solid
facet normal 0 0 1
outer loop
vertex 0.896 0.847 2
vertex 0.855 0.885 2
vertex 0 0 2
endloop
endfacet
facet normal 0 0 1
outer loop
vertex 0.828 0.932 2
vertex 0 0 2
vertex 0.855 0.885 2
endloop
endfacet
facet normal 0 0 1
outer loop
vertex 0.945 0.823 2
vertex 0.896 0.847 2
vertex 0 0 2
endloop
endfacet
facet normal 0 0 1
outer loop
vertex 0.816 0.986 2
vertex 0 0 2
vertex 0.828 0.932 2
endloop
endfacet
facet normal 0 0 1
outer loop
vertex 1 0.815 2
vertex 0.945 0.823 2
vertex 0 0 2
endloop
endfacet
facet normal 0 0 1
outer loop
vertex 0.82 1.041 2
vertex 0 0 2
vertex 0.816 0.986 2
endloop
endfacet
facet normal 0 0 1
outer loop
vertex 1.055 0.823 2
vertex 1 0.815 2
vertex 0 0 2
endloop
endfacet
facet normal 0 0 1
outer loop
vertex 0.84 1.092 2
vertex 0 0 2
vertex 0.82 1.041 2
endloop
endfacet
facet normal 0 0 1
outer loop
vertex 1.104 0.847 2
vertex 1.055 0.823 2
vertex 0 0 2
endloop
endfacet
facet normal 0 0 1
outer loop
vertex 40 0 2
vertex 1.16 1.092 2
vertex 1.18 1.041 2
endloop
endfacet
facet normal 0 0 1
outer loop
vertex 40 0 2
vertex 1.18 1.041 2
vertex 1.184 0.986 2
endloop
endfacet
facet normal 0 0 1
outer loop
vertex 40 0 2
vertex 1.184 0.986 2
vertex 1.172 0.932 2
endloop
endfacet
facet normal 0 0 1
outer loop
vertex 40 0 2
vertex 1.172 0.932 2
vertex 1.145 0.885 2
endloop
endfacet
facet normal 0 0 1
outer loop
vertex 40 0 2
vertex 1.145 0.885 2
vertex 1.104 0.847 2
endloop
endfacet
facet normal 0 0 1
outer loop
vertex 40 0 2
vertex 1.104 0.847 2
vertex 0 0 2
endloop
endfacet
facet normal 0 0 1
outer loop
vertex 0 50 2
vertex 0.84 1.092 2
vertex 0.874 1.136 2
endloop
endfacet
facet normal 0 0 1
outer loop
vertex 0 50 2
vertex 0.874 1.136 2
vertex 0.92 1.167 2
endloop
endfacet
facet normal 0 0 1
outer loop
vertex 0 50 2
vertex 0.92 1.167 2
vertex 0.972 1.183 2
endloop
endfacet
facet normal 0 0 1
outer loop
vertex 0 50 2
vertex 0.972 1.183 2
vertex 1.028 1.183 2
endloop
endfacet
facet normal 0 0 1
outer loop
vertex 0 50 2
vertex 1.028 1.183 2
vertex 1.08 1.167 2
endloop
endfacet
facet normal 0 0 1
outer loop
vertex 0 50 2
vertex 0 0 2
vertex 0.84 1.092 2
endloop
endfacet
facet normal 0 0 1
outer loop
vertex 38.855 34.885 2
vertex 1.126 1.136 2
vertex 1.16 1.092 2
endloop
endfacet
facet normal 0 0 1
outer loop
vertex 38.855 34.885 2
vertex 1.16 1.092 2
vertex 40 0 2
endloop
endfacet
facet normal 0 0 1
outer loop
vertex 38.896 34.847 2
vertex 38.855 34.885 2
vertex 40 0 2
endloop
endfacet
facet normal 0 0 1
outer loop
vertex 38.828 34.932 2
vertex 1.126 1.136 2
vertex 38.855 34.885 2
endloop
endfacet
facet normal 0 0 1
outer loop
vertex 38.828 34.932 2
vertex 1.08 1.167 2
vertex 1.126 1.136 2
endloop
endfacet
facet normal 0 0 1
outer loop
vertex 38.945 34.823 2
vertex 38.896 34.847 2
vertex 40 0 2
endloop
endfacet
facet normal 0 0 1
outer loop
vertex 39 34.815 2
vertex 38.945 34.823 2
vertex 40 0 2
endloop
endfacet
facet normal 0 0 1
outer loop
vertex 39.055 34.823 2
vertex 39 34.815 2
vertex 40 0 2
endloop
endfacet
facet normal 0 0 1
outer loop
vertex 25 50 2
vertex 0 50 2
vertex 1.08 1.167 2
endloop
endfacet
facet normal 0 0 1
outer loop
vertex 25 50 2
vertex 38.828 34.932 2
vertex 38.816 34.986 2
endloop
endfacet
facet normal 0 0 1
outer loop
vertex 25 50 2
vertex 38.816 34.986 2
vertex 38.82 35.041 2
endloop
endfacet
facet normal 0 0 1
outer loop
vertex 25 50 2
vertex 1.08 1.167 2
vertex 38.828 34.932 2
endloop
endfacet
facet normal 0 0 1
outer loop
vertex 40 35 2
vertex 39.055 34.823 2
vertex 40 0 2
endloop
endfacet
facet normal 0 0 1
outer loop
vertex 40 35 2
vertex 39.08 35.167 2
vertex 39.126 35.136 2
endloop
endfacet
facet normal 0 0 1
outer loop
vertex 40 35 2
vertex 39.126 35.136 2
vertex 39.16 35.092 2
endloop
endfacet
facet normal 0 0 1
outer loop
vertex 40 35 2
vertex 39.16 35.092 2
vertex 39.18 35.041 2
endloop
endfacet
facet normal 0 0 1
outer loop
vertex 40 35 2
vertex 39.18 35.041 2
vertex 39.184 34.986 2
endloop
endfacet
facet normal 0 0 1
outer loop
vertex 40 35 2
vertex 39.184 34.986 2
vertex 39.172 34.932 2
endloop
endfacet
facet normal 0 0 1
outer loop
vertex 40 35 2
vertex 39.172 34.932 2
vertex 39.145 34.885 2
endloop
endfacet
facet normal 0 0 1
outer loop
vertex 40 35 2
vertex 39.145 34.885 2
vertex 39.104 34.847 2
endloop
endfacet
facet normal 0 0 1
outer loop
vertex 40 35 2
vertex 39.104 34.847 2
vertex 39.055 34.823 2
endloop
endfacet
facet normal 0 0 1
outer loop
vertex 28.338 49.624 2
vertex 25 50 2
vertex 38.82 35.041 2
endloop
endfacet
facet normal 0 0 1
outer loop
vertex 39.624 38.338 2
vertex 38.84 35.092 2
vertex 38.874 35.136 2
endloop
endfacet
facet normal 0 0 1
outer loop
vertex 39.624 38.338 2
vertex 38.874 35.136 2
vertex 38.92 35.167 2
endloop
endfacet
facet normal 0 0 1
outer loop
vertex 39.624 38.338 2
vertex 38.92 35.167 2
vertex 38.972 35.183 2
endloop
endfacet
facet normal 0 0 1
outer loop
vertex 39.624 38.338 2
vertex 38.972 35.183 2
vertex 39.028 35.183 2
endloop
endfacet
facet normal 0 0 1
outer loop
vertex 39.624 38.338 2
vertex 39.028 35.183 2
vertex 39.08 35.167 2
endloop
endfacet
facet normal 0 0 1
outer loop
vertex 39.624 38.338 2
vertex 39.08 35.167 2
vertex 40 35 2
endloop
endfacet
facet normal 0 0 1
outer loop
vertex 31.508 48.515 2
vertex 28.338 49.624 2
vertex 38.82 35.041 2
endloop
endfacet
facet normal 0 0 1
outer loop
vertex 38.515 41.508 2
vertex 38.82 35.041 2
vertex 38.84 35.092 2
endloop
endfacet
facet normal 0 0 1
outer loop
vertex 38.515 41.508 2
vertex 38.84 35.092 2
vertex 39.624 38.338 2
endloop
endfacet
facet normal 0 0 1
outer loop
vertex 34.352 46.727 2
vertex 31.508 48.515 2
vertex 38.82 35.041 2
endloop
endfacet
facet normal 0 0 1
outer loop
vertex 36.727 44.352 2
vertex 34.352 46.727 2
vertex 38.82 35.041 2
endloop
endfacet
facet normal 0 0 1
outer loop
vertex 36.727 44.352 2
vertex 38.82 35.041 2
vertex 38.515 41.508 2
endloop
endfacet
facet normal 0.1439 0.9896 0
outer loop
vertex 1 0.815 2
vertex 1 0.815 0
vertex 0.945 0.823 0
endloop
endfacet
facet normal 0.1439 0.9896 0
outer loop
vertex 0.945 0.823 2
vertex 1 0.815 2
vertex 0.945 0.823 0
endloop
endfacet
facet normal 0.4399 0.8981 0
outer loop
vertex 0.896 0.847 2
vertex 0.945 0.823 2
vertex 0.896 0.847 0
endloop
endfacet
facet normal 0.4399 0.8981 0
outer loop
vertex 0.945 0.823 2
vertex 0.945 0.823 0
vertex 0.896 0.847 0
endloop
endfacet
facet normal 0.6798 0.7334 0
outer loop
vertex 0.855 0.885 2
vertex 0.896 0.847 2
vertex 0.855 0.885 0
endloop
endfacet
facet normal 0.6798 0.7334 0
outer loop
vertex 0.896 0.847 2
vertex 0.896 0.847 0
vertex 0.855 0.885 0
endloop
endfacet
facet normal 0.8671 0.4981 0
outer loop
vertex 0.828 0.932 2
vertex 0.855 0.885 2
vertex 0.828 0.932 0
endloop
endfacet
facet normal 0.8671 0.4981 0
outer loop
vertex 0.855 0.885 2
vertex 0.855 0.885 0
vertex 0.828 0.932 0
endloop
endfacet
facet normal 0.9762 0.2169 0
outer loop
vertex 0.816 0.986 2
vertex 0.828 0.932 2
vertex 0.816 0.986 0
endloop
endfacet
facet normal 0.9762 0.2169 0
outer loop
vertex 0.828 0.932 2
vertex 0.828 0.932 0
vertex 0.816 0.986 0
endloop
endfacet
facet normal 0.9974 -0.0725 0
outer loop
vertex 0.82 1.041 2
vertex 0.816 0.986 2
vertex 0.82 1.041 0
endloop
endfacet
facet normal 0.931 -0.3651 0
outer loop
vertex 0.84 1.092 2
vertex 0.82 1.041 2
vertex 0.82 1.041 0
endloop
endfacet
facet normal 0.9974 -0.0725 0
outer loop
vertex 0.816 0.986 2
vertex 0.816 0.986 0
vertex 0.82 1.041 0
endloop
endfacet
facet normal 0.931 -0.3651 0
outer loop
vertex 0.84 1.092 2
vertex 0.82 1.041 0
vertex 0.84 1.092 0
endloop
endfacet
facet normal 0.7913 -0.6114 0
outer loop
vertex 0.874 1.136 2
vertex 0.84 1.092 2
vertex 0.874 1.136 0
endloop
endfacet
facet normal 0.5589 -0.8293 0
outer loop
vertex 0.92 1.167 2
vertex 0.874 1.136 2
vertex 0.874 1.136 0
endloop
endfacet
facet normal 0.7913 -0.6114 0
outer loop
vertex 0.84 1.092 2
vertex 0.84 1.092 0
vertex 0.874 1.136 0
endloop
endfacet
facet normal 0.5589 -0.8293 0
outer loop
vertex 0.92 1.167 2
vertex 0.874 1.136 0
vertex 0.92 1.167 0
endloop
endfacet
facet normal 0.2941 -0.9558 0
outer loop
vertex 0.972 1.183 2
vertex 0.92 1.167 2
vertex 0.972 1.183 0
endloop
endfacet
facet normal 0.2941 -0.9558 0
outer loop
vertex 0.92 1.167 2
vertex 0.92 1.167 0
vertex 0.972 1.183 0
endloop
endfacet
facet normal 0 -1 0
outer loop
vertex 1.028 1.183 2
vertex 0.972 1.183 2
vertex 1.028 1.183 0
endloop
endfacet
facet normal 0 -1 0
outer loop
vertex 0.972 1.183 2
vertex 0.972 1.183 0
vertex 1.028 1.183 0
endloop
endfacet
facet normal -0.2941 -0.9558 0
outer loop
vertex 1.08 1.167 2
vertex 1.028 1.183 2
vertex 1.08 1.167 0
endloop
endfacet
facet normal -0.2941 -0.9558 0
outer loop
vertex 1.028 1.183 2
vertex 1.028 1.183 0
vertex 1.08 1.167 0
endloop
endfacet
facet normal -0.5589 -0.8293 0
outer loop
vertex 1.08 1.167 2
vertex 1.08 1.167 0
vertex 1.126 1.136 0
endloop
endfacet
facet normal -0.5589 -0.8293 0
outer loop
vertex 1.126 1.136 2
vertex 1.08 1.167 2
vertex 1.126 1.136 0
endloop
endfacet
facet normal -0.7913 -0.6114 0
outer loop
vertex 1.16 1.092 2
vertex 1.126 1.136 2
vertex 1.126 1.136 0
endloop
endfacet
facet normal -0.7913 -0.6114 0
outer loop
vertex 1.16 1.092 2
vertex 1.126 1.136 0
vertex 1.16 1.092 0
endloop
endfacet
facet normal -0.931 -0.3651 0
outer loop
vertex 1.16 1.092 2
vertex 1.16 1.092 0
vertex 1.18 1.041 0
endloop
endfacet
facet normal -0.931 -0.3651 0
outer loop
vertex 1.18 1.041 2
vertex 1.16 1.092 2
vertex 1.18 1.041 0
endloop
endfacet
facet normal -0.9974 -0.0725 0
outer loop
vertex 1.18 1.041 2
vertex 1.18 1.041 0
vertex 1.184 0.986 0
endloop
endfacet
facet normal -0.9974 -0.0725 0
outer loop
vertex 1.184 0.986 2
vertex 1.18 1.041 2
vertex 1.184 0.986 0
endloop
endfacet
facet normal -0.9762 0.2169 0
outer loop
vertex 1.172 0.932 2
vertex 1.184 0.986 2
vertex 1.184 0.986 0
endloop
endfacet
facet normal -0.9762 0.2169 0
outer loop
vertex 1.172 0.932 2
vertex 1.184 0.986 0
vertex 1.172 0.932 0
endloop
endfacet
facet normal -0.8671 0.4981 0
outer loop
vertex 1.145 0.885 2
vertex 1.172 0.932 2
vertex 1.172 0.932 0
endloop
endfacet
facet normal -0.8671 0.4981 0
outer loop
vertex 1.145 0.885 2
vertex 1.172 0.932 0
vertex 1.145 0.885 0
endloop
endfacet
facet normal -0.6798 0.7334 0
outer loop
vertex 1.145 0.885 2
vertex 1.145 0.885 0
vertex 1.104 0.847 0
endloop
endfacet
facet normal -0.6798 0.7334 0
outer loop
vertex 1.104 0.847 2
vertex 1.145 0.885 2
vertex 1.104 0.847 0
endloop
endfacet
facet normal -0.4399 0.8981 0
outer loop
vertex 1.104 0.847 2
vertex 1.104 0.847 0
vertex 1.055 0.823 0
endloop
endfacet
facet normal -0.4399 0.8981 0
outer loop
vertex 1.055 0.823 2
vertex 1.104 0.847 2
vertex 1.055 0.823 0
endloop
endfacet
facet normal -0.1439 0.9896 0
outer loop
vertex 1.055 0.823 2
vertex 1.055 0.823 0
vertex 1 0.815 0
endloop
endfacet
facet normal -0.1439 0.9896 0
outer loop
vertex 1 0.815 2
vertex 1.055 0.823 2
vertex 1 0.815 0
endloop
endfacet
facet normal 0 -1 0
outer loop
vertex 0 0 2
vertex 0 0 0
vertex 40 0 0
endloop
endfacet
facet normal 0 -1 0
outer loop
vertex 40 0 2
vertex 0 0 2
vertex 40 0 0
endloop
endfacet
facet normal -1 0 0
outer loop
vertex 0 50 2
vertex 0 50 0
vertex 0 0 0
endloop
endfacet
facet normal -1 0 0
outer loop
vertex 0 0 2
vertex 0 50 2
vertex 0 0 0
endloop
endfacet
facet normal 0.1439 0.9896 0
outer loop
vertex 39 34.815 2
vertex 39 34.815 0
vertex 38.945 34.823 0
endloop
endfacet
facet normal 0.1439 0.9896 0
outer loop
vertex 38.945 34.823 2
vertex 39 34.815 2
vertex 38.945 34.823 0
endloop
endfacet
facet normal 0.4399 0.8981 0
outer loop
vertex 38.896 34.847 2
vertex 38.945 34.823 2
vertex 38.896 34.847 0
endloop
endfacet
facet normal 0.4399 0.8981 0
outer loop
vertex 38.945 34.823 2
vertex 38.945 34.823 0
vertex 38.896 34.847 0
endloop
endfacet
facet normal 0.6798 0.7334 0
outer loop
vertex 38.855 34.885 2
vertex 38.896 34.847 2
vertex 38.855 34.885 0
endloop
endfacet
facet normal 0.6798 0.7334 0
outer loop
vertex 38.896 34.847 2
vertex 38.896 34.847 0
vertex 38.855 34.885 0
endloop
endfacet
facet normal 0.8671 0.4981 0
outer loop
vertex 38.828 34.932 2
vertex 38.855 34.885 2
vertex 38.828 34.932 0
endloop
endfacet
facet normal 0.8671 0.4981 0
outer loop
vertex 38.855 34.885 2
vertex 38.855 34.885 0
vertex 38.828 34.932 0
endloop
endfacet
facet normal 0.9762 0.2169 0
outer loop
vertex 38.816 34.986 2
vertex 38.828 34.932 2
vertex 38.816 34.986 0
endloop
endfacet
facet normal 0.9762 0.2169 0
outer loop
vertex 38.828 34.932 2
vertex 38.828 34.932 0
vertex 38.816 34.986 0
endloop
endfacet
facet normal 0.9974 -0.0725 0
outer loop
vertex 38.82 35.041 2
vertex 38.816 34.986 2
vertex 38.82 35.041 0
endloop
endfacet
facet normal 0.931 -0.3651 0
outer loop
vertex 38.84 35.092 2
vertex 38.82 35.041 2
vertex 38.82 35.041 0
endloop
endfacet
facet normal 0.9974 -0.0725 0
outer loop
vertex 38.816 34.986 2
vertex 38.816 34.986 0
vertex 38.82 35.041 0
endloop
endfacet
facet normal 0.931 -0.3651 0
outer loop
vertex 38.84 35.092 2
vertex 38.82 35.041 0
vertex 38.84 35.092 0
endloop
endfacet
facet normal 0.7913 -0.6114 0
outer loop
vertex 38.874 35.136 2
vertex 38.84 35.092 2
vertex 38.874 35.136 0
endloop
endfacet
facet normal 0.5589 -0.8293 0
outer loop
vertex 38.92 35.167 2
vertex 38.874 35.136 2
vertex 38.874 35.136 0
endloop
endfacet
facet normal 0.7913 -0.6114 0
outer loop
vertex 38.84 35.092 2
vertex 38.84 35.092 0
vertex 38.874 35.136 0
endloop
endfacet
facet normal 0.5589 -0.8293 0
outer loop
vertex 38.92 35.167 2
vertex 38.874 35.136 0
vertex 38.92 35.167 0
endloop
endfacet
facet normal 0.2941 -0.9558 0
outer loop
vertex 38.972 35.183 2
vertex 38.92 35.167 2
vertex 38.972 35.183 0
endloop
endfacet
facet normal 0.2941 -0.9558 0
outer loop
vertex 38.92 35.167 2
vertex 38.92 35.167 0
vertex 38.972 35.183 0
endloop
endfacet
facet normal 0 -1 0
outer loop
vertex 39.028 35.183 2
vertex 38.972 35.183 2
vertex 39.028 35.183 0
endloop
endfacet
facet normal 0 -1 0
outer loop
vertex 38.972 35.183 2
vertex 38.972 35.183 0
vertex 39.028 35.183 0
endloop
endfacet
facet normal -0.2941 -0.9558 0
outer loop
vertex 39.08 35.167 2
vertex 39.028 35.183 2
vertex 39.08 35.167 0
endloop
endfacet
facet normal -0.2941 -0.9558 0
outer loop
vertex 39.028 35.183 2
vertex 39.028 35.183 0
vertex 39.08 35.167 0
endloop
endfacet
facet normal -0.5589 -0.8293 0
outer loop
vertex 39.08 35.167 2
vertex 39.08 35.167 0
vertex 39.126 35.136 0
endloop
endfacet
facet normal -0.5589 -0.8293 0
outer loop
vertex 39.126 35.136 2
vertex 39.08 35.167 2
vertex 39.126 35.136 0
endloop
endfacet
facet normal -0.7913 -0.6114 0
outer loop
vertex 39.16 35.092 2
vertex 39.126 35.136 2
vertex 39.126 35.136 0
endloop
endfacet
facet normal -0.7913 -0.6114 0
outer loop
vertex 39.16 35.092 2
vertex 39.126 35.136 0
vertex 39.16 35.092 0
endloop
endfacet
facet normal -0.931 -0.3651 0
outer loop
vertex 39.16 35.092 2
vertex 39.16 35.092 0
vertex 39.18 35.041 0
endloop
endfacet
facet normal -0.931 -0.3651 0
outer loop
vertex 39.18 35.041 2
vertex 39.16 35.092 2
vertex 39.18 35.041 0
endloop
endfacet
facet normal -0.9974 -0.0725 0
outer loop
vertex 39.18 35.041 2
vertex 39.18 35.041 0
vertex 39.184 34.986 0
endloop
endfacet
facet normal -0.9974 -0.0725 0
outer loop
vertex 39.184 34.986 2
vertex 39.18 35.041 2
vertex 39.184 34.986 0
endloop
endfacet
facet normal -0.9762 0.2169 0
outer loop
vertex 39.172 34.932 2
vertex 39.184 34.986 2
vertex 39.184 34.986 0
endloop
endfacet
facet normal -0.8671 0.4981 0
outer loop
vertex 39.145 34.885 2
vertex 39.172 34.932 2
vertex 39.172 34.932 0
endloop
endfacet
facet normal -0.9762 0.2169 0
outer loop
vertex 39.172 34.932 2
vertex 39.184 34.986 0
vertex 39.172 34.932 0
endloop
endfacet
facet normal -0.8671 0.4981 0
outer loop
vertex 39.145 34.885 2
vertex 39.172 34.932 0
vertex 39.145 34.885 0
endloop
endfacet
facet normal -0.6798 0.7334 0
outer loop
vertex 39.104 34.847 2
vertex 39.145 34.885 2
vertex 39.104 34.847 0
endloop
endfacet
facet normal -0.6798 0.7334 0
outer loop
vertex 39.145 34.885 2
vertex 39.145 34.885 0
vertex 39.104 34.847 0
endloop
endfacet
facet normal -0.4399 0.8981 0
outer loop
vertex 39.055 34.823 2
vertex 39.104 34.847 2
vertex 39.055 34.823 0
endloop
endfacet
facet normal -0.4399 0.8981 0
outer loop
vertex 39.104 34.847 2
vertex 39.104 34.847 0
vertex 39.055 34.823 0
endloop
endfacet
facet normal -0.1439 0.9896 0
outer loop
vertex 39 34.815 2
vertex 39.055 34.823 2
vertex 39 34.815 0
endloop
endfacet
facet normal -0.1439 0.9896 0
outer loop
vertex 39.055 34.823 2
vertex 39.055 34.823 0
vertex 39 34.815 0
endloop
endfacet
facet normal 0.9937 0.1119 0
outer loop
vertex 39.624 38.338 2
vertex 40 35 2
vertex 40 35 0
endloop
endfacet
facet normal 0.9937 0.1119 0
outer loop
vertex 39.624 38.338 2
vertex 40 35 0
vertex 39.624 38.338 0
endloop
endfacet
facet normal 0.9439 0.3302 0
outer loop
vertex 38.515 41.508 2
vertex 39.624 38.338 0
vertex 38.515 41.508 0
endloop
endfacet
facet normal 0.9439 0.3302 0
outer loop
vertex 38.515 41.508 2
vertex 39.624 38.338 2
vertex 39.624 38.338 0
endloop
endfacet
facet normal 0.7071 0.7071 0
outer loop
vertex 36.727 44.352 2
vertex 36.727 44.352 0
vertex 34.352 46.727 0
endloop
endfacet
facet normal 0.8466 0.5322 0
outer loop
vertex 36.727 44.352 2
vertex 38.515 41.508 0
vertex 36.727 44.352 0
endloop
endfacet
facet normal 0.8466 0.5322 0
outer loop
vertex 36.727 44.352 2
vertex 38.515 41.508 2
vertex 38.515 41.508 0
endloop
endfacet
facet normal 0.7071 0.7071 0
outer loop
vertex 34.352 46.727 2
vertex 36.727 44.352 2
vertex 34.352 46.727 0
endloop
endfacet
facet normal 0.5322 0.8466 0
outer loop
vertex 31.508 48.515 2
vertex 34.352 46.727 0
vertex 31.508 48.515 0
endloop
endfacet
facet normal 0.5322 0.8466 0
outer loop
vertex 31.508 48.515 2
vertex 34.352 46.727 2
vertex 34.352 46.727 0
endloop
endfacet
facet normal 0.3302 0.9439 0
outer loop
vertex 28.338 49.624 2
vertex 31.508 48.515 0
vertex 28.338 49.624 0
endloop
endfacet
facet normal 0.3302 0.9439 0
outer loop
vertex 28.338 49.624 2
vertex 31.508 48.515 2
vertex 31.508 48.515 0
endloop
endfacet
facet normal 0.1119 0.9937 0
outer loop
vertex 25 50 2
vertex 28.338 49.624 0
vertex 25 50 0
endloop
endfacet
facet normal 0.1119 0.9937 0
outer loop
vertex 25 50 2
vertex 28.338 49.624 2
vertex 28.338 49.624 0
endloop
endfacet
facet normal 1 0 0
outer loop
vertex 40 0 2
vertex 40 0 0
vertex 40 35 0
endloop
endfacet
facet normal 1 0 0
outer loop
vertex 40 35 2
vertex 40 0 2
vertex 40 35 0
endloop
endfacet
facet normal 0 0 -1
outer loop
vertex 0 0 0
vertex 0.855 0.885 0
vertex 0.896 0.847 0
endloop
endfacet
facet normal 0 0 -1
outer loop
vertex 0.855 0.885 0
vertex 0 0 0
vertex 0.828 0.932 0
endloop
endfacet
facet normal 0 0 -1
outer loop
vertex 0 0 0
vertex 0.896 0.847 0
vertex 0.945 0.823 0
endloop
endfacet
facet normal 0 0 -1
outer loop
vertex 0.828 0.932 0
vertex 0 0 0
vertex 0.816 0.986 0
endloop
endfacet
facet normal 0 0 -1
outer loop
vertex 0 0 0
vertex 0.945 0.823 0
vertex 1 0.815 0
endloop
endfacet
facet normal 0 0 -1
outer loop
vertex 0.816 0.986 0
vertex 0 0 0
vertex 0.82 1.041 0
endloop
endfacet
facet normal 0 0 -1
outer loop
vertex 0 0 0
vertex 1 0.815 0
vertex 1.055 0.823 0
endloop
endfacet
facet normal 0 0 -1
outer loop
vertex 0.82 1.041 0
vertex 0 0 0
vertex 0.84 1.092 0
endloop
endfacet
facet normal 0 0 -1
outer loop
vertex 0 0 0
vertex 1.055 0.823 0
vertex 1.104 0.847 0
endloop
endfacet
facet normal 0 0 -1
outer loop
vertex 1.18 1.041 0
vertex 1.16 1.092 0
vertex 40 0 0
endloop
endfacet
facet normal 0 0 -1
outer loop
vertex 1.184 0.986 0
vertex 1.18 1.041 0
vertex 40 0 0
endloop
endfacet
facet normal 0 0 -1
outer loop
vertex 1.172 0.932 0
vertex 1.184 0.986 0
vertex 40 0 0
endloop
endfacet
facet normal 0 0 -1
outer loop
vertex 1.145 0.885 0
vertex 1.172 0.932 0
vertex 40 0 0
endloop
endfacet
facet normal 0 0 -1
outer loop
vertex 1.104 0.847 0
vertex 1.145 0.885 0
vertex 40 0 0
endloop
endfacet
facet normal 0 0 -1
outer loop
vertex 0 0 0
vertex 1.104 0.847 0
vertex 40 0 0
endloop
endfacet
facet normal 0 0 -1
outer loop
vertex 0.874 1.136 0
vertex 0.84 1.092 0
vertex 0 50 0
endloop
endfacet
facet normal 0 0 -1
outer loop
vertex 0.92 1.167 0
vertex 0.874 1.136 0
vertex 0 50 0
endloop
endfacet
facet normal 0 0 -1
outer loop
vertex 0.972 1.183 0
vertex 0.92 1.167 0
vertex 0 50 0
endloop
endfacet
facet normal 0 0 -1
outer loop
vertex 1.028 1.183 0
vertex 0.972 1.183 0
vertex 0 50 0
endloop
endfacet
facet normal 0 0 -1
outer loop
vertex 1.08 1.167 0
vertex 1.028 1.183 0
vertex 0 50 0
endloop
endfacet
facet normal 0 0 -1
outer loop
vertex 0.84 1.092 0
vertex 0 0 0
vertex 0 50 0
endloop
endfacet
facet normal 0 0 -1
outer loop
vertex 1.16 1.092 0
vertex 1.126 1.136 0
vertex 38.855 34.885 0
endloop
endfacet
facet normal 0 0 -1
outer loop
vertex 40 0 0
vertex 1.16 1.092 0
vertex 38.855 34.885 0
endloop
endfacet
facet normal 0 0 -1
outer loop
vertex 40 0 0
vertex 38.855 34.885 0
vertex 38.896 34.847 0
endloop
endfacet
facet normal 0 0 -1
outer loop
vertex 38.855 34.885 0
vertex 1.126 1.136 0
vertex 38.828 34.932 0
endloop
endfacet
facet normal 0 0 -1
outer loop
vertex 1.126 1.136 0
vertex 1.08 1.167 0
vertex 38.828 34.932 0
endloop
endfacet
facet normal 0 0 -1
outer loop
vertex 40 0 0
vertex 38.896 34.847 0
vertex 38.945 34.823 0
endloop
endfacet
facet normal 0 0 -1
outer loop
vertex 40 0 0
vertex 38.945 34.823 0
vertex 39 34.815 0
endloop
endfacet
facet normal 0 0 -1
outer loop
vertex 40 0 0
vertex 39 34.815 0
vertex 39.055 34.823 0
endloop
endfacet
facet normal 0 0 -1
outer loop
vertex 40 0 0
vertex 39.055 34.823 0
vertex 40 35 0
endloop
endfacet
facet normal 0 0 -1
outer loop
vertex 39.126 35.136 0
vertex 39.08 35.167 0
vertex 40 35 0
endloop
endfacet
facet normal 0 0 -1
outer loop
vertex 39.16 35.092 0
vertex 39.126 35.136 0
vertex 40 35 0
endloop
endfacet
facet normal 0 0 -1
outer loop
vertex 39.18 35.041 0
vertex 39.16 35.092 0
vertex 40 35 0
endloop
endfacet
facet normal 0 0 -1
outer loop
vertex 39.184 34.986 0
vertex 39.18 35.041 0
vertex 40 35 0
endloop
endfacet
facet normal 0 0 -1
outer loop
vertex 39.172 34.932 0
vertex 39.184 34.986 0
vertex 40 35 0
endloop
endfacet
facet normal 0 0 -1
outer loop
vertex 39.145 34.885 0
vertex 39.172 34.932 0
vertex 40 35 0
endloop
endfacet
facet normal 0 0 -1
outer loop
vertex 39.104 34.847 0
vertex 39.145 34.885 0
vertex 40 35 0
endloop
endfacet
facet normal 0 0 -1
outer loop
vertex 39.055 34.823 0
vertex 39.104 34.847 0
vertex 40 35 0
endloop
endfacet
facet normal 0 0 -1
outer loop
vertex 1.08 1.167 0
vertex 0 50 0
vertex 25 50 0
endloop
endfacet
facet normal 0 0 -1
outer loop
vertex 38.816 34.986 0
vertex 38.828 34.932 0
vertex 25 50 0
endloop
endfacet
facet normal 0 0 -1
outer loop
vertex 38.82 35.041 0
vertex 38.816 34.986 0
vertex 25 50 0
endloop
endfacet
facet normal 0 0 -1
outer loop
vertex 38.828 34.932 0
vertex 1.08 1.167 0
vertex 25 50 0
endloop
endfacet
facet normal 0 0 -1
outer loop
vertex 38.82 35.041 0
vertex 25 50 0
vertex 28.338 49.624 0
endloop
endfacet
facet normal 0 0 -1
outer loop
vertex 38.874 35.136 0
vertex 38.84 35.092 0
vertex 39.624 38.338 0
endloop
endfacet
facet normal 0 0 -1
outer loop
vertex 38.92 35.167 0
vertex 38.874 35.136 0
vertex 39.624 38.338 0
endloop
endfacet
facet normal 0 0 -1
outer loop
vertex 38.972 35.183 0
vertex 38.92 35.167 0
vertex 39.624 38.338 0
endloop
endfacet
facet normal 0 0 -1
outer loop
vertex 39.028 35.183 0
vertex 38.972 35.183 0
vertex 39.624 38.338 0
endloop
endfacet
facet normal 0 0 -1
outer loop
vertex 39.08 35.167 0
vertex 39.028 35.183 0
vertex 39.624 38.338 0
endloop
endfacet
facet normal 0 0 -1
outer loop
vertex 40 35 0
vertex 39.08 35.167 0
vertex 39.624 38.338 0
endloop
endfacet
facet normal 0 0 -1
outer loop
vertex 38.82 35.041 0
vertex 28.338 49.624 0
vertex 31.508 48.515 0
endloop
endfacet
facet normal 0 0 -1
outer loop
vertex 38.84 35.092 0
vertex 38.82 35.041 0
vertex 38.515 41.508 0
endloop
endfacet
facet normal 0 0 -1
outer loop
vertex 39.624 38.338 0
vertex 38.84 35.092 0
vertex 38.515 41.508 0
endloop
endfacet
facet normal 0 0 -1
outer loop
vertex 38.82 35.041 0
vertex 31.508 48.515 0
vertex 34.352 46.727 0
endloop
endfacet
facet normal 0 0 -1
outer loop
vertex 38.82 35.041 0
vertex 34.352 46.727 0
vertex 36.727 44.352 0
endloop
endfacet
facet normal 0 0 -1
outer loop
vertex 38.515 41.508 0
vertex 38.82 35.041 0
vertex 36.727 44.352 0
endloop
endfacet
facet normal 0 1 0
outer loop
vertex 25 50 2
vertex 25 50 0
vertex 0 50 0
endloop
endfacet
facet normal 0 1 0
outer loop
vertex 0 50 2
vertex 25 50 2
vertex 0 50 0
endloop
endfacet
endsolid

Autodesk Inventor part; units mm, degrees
ref_plane "YZ Plane" through (0, 0, 0) normal (1, 0, 0) x (0, 1, 0)
ref_plane "XZ Plane" through (0, 0, 0) normal (0, 1, 0) x (-1, 0, 0)
ref_plane "XY Plane" through (0, 0, 0) normal (0, 0, 1) x (1, 0, 0)
sketch "Sketch1" plane through (0, 0, 0) normal (0, 0, 1) x (1, 0, 0)
  point P0 (0, 0)
sketch "Sketch2" plane through (0, 0, 0) normal (0, 0, 1) x (1, 0, 0)
  line L0 (0, 0) -> (40, 0)
  line L1 (40, 0) -> (40, 50)
  line L2 (40, 50) -> (0, 50)
  line L3 (0, 50) -> (0, 0)
extrude "Extrusion1" add sketch "Sketch2" along normal blind 2
sketch "Sketch3" plane through (0, 0, 2) normal (0, 0, 1) x (1, 0, 0)
  point P0 (0, 0)
fillet "Fillet1" radius 15 1 edges at (40, 50, 1)
sketch "Sketch4" plane through (0, 0, 2) normal (0, 0, 1) x (1, 0, 0)
  point P0 (0, 0)
  point P1 (1, 1)
  point P2 (39, 35)
hole "Hole1" at (1, 1, 2) direction (0, 0, -1) diameter 0.37 end through all thread size "M0.5x0.125" class "6H" standard "ISO Metric profile"
sketch "Sketch5" plane through (0, 0, 2) normal (0, 0, 1) x (1, 0, 0)
  point P0 (0, 0)
  point P1 (39, 35)
hole "Hole2" at (39, 35, 2) direction (0, 0, -1) diameter 0.37 end through all thread size "M0.5x0.125" class "6H" standard "ISO Metric profile"
properties part number "Dół"
